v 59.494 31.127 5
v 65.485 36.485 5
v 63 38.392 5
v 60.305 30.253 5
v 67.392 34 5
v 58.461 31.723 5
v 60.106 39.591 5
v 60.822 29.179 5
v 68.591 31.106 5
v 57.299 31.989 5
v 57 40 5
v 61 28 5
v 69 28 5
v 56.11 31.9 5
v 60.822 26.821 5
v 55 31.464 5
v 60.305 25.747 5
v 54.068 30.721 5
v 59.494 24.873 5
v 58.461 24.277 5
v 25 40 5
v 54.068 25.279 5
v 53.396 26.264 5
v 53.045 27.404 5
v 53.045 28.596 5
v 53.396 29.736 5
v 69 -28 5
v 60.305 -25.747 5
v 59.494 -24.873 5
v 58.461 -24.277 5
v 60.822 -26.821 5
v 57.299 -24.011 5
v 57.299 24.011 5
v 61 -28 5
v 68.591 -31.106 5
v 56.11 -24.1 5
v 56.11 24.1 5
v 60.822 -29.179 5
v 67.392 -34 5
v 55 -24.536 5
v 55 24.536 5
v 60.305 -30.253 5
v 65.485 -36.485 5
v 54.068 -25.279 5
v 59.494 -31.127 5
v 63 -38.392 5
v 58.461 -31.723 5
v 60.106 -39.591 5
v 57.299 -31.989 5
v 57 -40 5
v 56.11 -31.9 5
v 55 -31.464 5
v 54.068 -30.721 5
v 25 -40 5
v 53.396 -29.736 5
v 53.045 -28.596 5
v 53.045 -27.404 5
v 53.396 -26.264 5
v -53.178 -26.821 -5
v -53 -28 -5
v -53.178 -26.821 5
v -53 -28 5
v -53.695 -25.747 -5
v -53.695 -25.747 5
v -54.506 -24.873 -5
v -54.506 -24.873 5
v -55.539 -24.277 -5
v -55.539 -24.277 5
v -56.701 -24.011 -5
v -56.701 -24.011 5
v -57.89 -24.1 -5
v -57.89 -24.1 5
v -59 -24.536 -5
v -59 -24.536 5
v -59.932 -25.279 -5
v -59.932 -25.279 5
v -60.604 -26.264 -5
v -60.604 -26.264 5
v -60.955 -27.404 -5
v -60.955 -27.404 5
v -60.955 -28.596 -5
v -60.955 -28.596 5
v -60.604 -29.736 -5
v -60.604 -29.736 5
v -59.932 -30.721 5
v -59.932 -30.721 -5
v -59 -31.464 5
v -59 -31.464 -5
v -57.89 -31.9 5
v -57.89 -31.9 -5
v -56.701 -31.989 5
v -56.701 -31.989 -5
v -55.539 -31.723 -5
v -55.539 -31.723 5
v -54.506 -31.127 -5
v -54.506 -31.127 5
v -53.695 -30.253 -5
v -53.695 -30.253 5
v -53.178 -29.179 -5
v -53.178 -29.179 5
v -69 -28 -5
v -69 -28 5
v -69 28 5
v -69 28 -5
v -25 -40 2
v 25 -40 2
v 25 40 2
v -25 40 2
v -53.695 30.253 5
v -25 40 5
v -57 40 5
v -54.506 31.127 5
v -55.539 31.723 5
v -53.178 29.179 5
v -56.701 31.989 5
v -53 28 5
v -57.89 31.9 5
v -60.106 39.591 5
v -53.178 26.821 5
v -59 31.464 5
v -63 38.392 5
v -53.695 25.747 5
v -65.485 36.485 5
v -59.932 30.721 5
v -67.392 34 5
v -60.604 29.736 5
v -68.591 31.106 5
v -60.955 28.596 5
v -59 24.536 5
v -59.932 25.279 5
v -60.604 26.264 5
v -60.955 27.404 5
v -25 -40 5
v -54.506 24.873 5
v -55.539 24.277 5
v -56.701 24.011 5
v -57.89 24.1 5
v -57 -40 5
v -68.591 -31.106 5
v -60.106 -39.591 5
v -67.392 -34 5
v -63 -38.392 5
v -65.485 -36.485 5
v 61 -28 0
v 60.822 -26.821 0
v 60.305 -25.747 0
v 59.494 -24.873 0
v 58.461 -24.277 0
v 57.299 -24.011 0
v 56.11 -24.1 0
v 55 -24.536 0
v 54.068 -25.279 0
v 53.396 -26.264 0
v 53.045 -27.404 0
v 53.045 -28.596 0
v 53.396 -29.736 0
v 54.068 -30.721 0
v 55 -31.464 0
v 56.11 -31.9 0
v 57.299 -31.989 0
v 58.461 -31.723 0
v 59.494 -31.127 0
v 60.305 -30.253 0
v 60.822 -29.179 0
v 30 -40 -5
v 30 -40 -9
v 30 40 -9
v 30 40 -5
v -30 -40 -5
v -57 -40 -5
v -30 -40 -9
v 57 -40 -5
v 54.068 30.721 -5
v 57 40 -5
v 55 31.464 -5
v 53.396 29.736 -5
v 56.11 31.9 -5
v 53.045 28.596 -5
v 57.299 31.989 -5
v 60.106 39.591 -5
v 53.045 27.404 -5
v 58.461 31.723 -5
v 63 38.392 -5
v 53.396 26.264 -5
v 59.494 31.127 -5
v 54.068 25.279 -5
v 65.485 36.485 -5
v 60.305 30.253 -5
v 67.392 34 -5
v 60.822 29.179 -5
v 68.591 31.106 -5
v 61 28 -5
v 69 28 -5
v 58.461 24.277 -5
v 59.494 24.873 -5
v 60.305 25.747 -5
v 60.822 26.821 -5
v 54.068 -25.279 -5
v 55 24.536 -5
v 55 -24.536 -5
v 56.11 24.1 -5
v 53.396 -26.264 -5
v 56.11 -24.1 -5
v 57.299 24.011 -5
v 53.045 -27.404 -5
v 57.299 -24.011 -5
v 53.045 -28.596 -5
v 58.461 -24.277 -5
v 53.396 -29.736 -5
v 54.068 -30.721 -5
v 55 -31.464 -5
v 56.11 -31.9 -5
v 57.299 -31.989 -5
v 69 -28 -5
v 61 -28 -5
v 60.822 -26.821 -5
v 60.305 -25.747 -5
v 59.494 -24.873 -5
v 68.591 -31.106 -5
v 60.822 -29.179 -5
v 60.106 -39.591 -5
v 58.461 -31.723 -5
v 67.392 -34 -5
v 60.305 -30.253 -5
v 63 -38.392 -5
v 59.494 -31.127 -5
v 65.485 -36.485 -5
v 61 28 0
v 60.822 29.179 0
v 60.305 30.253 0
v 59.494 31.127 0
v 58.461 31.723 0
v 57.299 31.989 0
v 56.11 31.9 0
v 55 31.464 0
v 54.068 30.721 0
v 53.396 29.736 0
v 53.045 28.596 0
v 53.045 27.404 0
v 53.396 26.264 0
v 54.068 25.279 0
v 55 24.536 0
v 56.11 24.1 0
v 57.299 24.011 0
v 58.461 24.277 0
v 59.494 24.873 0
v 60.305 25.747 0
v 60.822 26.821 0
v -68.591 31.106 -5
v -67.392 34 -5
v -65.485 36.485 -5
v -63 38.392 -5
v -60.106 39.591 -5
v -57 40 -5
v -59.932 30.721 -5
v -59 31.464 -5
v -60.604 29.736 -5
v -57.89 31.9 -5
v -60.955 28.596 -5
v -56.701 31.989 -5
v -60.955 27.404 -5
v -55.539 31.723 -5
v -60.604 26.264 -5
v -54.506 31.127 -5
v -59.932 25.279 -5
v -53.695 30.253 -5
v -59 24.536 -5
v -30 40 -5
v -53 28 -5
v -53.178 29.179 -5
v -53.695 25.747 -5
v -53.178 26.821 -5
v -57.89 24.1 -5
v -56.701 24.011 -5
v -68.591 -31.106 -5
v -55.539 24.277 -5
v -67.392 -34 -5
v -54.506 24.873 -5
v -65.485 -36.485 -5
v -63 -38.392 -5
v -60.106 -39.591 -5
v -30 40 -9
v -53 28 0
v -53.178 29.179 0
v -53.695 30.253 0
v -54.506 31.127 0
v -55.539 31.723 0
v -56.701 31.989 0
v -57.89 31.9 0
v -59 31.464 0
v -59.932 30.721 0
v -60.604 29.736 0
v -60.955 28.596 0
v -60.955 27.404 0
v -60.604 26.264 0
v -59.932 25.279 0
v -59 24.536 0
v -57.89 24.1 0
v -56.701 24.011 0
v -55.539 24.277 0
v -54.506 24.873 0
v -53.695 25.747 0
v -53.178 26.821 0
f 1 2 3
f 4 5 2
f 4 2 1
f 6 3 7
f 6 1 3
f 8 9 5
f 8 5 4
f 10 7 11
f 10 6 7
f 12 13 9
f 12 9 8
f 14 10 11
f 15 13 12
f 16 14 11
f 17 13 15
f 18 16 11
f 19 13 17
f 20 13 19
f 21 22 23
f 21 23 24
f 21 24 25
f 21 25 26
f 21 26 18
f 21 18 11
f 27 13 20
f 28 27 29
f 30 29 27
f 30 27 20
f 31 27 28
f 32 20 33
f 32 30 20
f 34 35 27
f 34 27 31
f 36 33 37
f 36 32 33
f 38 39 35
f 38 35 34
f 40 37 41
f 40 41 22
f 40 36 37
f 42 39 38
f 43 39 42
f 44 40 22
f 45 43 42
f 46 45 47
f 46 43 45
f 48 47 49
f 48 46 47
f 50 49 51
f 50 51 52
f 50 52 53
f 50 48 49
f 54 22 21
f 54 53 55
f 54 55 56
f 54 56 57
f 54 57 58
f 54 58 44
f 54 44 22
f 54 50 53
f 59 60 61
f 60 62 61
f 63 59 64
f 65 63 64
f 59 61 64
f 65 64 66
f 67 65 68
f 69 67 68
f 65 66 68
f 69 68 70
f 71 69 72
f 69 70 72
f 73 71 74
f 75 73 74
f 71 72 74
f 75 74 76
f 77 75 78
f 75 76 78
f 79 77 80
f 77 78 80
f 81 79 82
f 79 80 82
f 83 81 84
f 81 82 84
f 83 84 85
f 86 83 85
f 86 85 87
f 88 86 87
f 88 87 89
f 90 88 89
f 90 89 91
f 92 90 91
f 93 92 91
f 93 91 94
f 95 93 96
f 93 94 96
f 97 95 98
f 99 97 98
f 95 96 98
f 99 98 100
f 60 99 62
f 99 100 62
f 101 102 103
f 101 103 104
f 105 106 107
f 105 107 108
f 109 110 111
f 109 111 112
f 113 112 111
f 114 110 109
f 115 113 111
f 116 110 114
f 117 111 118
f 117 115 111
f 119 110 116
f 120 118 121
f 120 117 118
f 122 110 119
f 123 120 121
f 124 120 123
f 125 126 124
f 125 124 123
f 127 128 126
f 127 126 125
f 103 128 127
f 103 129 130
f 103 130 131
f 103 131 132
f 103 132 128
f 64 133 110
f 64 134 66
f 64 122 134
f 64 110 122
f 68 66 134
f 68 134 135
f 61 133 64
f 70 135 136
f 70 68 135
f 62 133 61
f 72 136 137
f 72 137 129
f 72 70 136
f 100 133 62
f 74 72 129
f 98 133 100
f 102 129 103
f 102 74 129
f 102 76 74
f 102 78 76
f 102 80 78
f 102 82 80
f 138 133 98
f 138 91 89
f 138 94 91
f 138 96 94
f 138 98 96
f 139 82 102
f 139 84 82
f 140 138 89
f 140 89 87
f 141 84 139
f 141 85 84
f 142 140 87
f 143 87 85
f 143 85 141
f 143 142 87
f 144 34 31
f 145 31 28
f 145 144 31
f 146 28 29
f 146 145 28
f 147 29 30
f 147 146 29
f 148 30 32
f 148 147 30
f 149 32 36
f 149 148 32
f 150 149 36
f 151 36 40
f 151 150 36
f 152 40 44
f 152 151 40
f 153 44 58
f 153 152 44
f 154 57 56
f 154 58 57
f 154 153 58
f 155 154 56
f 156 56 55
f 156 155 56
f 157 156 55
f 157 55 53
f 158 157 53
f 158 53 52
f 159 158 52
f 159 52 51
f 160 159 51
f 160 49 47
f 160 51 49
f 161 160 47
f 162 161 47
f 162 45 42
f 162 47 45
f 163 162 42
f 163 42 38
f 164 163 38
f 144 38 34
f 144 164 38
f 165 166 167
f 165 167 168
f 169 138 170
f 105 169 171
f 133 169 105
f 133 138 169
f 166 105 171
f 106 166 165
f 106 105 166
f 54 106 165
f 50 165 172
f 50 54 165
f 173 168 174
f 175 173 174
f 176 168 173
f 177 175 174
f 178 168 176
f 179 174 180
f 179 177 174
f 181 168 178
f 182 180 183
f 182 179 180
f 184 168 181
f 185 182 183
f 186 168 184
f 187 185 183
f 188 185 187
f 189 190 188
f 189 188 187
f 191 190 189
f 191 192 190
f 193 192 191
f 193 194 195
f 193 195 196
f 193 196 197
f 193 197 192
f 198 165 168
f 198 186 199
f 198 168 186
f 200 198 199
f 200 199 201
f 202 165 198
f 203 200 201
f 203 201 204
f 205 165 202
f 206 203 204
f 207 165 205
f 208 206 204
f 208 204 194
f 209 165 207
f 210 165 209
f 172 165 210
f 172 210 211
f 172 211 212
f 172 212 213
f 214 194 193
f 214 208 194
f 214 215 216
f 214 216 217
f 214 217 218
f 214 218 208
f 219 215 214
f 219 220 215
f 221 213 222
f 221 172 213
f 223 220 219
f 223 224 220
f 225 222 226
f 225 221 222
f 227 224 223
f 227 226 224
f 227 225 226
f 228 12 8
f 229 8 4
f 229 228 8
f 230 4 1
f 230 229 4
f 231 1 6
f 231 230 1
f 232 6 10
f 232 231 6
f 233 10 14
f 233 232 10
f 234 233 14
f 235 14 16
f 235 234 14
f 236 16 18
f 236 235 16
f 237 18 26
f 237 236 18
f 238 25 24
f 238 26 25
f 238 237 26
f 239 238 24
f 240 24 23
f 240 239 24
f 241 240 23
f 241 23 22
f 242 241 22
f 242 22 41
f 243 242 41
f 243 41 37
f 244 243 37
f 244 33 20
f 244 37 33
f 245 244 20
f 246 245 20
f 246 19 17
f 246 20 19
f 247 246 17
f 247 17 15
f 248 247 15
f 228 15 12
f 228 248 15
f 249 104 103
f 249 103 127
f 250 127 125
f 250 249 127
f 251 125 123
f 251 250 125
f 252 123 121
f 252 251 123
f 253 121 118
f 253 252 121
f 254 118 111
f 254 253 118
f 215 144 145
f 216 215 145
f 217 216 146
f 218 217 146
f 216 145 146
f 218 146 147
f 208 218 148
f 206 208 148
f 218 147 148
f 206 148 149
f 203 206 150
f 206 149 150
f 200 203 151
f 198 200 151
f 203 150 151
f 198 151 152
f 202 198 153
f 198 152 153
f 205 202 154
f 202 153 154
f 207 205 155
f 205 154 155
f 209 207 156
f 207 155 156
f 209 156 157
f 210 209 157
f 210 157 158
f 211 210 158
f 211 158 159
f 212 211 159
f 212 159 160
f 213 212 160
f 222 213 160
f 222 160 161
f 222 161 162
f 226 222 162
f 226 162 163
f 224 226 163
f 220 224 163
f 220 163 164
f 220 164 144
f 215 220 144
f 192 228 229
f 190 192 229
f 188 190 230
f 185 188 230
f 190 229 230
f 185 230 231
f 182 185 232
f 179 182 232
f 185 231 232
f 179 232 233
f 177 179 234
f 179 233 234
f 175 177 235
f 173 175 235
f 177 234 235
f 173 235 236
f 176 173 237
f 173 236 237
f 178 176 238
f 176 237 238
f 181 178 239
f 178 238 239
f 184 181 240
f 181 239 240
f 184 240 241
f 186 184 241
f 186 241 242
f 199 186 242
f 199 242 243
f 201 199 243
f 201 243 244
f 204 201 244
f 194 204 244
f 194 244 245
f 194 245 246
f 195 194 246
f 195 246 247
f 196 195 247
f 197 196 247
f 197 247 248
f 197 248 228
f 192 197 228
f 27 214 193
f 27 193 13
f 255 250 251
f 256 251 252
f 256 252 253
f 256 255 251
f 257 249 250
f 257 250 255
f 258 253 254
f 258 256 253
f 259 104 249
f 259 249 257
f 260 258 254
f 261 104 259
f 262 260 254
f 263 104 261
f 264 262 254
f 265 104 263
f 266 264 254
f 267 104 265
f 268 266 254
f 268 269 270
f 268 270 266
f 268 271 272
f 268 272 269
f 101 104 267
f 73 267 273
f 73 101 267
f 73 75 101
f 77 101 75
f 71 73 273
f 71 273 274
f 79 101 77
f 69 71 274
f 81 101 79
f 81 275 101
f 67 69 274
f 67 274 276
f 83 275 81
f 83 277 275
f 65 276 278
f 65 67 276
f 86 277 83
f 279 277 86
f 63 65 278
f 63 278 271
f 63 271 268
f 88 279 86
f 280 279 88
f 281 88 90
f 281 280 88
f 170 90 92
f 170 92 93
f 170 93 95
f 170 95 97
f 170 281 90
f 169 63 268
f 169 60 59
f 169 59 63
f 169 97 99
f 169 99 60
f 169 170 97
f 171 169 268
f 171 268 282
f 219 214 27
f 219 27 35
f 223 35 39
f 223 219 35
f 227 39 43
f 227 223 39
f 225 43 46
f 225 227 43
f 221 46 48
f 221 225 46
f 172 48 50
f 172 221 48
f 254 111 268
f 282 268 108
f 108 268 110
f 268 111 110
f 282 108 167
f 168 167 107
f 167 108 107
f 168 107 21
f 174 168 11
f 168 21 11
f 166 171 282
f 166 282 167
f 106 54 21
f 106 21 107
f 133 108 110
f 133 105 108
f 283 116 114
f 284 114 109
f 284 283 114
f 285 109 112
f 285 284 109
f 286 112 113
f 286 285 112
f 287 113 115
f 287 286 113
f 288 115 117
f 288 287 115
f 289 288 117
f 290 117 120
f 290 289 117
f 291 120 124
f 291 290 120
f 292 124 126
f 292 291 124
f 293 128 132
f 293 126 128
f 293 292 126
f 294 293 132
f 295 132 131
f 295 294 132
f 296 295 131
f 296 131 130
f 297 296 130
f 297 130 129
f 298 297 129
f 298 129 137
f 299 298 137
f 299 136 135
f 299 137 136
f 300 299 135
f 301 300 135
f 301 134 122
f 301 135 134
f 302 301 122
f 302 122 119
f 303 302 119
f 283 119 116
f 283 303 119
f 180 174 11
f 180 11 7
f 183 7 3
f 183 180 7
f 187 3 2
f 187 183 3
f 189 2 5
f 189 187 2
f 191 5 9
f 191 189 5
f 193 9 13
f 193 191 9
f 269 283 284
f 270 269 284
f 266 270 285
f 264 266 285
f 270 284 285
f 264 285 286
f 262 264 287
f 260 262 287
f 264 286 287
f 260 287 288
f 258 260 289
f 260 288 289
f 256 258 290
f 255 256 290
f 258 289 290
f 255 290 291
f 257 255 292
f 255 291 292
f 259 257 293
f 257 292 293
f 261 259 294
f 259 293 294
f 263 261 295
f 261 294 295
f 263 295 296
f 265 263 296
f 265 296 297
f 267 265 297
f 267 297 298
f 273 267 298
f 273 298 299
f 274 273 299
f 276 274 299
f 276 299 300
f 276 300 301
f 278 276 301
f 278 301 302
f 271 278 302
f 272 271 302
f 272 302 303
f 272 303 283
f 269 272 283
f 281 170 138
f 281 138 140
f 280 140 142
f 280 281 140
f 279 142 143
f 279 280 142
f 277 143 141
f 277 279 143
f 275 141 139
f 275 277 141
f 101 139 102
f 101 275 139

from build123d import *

# Parameters (mm, degrees)
F1_DEPTH = 40
F2_R     = 4
F3_DEPTH = 40


with BuildPart() as f1:
    # F0 (on Front) → F1 (new body, symmetric)
    with BuildSketch(Plane.XZ):
        Polygon((-69, 5), (-69, -5), (-30, -5), (-30, -9), (30, -9), (30, -5), (69, -5), (69, 5), (25, 5), (25, 2), (-25, 2), (-25, 5), align=None)
    extrude(amount=F1_DEPTH, both=True)

    # F2 (on Top) → F3 (cut, symmetric)
    with BuildSketch(Plane.XY):
        with BuildLine():
            ThreePointArc((-69, 28), (-65.485281, 36.485281), (-57, 40))
            Line((-57, 40), (-69, 40))
            Line((-69, 40), (-69, 28))
        make_face()
        with BuildLine():
            ThreePointArc((-57, -40), (-65.485281, -36.485281), (-69, -28))
            Line((-69, -28), (-69, -40))
            Line((-69, -40), (-57, -40))
        make_face()
        with BuildLine():
            ThreePointArc((69, -28), (65.485281, -36.485281), (57, -40))
            Line((57, -40), (69, -40))
            Line((69, -40), (69, -28))
        make_face()
        with BuildLine():
            ThreePointArc((57, 40), (65.485281, 36.485281), (69, 28))
            Line((69, 28), (69, 40))
            Line((69, 40), (57, 40))
        make_face()
        with Locations((-57, 28)):
            Circle(F2_R)
        with Locations((57, 28)):
            Circle(F2_R)
        with Locations((57, -28)):
            Circle(F2_R)
        with Locations((-57, -28)):
            Circle(F2_R)
    extrude(amount=F3_DEPTH, both=True, mode=Mode.SUBTRACT)


solid = f1.part
